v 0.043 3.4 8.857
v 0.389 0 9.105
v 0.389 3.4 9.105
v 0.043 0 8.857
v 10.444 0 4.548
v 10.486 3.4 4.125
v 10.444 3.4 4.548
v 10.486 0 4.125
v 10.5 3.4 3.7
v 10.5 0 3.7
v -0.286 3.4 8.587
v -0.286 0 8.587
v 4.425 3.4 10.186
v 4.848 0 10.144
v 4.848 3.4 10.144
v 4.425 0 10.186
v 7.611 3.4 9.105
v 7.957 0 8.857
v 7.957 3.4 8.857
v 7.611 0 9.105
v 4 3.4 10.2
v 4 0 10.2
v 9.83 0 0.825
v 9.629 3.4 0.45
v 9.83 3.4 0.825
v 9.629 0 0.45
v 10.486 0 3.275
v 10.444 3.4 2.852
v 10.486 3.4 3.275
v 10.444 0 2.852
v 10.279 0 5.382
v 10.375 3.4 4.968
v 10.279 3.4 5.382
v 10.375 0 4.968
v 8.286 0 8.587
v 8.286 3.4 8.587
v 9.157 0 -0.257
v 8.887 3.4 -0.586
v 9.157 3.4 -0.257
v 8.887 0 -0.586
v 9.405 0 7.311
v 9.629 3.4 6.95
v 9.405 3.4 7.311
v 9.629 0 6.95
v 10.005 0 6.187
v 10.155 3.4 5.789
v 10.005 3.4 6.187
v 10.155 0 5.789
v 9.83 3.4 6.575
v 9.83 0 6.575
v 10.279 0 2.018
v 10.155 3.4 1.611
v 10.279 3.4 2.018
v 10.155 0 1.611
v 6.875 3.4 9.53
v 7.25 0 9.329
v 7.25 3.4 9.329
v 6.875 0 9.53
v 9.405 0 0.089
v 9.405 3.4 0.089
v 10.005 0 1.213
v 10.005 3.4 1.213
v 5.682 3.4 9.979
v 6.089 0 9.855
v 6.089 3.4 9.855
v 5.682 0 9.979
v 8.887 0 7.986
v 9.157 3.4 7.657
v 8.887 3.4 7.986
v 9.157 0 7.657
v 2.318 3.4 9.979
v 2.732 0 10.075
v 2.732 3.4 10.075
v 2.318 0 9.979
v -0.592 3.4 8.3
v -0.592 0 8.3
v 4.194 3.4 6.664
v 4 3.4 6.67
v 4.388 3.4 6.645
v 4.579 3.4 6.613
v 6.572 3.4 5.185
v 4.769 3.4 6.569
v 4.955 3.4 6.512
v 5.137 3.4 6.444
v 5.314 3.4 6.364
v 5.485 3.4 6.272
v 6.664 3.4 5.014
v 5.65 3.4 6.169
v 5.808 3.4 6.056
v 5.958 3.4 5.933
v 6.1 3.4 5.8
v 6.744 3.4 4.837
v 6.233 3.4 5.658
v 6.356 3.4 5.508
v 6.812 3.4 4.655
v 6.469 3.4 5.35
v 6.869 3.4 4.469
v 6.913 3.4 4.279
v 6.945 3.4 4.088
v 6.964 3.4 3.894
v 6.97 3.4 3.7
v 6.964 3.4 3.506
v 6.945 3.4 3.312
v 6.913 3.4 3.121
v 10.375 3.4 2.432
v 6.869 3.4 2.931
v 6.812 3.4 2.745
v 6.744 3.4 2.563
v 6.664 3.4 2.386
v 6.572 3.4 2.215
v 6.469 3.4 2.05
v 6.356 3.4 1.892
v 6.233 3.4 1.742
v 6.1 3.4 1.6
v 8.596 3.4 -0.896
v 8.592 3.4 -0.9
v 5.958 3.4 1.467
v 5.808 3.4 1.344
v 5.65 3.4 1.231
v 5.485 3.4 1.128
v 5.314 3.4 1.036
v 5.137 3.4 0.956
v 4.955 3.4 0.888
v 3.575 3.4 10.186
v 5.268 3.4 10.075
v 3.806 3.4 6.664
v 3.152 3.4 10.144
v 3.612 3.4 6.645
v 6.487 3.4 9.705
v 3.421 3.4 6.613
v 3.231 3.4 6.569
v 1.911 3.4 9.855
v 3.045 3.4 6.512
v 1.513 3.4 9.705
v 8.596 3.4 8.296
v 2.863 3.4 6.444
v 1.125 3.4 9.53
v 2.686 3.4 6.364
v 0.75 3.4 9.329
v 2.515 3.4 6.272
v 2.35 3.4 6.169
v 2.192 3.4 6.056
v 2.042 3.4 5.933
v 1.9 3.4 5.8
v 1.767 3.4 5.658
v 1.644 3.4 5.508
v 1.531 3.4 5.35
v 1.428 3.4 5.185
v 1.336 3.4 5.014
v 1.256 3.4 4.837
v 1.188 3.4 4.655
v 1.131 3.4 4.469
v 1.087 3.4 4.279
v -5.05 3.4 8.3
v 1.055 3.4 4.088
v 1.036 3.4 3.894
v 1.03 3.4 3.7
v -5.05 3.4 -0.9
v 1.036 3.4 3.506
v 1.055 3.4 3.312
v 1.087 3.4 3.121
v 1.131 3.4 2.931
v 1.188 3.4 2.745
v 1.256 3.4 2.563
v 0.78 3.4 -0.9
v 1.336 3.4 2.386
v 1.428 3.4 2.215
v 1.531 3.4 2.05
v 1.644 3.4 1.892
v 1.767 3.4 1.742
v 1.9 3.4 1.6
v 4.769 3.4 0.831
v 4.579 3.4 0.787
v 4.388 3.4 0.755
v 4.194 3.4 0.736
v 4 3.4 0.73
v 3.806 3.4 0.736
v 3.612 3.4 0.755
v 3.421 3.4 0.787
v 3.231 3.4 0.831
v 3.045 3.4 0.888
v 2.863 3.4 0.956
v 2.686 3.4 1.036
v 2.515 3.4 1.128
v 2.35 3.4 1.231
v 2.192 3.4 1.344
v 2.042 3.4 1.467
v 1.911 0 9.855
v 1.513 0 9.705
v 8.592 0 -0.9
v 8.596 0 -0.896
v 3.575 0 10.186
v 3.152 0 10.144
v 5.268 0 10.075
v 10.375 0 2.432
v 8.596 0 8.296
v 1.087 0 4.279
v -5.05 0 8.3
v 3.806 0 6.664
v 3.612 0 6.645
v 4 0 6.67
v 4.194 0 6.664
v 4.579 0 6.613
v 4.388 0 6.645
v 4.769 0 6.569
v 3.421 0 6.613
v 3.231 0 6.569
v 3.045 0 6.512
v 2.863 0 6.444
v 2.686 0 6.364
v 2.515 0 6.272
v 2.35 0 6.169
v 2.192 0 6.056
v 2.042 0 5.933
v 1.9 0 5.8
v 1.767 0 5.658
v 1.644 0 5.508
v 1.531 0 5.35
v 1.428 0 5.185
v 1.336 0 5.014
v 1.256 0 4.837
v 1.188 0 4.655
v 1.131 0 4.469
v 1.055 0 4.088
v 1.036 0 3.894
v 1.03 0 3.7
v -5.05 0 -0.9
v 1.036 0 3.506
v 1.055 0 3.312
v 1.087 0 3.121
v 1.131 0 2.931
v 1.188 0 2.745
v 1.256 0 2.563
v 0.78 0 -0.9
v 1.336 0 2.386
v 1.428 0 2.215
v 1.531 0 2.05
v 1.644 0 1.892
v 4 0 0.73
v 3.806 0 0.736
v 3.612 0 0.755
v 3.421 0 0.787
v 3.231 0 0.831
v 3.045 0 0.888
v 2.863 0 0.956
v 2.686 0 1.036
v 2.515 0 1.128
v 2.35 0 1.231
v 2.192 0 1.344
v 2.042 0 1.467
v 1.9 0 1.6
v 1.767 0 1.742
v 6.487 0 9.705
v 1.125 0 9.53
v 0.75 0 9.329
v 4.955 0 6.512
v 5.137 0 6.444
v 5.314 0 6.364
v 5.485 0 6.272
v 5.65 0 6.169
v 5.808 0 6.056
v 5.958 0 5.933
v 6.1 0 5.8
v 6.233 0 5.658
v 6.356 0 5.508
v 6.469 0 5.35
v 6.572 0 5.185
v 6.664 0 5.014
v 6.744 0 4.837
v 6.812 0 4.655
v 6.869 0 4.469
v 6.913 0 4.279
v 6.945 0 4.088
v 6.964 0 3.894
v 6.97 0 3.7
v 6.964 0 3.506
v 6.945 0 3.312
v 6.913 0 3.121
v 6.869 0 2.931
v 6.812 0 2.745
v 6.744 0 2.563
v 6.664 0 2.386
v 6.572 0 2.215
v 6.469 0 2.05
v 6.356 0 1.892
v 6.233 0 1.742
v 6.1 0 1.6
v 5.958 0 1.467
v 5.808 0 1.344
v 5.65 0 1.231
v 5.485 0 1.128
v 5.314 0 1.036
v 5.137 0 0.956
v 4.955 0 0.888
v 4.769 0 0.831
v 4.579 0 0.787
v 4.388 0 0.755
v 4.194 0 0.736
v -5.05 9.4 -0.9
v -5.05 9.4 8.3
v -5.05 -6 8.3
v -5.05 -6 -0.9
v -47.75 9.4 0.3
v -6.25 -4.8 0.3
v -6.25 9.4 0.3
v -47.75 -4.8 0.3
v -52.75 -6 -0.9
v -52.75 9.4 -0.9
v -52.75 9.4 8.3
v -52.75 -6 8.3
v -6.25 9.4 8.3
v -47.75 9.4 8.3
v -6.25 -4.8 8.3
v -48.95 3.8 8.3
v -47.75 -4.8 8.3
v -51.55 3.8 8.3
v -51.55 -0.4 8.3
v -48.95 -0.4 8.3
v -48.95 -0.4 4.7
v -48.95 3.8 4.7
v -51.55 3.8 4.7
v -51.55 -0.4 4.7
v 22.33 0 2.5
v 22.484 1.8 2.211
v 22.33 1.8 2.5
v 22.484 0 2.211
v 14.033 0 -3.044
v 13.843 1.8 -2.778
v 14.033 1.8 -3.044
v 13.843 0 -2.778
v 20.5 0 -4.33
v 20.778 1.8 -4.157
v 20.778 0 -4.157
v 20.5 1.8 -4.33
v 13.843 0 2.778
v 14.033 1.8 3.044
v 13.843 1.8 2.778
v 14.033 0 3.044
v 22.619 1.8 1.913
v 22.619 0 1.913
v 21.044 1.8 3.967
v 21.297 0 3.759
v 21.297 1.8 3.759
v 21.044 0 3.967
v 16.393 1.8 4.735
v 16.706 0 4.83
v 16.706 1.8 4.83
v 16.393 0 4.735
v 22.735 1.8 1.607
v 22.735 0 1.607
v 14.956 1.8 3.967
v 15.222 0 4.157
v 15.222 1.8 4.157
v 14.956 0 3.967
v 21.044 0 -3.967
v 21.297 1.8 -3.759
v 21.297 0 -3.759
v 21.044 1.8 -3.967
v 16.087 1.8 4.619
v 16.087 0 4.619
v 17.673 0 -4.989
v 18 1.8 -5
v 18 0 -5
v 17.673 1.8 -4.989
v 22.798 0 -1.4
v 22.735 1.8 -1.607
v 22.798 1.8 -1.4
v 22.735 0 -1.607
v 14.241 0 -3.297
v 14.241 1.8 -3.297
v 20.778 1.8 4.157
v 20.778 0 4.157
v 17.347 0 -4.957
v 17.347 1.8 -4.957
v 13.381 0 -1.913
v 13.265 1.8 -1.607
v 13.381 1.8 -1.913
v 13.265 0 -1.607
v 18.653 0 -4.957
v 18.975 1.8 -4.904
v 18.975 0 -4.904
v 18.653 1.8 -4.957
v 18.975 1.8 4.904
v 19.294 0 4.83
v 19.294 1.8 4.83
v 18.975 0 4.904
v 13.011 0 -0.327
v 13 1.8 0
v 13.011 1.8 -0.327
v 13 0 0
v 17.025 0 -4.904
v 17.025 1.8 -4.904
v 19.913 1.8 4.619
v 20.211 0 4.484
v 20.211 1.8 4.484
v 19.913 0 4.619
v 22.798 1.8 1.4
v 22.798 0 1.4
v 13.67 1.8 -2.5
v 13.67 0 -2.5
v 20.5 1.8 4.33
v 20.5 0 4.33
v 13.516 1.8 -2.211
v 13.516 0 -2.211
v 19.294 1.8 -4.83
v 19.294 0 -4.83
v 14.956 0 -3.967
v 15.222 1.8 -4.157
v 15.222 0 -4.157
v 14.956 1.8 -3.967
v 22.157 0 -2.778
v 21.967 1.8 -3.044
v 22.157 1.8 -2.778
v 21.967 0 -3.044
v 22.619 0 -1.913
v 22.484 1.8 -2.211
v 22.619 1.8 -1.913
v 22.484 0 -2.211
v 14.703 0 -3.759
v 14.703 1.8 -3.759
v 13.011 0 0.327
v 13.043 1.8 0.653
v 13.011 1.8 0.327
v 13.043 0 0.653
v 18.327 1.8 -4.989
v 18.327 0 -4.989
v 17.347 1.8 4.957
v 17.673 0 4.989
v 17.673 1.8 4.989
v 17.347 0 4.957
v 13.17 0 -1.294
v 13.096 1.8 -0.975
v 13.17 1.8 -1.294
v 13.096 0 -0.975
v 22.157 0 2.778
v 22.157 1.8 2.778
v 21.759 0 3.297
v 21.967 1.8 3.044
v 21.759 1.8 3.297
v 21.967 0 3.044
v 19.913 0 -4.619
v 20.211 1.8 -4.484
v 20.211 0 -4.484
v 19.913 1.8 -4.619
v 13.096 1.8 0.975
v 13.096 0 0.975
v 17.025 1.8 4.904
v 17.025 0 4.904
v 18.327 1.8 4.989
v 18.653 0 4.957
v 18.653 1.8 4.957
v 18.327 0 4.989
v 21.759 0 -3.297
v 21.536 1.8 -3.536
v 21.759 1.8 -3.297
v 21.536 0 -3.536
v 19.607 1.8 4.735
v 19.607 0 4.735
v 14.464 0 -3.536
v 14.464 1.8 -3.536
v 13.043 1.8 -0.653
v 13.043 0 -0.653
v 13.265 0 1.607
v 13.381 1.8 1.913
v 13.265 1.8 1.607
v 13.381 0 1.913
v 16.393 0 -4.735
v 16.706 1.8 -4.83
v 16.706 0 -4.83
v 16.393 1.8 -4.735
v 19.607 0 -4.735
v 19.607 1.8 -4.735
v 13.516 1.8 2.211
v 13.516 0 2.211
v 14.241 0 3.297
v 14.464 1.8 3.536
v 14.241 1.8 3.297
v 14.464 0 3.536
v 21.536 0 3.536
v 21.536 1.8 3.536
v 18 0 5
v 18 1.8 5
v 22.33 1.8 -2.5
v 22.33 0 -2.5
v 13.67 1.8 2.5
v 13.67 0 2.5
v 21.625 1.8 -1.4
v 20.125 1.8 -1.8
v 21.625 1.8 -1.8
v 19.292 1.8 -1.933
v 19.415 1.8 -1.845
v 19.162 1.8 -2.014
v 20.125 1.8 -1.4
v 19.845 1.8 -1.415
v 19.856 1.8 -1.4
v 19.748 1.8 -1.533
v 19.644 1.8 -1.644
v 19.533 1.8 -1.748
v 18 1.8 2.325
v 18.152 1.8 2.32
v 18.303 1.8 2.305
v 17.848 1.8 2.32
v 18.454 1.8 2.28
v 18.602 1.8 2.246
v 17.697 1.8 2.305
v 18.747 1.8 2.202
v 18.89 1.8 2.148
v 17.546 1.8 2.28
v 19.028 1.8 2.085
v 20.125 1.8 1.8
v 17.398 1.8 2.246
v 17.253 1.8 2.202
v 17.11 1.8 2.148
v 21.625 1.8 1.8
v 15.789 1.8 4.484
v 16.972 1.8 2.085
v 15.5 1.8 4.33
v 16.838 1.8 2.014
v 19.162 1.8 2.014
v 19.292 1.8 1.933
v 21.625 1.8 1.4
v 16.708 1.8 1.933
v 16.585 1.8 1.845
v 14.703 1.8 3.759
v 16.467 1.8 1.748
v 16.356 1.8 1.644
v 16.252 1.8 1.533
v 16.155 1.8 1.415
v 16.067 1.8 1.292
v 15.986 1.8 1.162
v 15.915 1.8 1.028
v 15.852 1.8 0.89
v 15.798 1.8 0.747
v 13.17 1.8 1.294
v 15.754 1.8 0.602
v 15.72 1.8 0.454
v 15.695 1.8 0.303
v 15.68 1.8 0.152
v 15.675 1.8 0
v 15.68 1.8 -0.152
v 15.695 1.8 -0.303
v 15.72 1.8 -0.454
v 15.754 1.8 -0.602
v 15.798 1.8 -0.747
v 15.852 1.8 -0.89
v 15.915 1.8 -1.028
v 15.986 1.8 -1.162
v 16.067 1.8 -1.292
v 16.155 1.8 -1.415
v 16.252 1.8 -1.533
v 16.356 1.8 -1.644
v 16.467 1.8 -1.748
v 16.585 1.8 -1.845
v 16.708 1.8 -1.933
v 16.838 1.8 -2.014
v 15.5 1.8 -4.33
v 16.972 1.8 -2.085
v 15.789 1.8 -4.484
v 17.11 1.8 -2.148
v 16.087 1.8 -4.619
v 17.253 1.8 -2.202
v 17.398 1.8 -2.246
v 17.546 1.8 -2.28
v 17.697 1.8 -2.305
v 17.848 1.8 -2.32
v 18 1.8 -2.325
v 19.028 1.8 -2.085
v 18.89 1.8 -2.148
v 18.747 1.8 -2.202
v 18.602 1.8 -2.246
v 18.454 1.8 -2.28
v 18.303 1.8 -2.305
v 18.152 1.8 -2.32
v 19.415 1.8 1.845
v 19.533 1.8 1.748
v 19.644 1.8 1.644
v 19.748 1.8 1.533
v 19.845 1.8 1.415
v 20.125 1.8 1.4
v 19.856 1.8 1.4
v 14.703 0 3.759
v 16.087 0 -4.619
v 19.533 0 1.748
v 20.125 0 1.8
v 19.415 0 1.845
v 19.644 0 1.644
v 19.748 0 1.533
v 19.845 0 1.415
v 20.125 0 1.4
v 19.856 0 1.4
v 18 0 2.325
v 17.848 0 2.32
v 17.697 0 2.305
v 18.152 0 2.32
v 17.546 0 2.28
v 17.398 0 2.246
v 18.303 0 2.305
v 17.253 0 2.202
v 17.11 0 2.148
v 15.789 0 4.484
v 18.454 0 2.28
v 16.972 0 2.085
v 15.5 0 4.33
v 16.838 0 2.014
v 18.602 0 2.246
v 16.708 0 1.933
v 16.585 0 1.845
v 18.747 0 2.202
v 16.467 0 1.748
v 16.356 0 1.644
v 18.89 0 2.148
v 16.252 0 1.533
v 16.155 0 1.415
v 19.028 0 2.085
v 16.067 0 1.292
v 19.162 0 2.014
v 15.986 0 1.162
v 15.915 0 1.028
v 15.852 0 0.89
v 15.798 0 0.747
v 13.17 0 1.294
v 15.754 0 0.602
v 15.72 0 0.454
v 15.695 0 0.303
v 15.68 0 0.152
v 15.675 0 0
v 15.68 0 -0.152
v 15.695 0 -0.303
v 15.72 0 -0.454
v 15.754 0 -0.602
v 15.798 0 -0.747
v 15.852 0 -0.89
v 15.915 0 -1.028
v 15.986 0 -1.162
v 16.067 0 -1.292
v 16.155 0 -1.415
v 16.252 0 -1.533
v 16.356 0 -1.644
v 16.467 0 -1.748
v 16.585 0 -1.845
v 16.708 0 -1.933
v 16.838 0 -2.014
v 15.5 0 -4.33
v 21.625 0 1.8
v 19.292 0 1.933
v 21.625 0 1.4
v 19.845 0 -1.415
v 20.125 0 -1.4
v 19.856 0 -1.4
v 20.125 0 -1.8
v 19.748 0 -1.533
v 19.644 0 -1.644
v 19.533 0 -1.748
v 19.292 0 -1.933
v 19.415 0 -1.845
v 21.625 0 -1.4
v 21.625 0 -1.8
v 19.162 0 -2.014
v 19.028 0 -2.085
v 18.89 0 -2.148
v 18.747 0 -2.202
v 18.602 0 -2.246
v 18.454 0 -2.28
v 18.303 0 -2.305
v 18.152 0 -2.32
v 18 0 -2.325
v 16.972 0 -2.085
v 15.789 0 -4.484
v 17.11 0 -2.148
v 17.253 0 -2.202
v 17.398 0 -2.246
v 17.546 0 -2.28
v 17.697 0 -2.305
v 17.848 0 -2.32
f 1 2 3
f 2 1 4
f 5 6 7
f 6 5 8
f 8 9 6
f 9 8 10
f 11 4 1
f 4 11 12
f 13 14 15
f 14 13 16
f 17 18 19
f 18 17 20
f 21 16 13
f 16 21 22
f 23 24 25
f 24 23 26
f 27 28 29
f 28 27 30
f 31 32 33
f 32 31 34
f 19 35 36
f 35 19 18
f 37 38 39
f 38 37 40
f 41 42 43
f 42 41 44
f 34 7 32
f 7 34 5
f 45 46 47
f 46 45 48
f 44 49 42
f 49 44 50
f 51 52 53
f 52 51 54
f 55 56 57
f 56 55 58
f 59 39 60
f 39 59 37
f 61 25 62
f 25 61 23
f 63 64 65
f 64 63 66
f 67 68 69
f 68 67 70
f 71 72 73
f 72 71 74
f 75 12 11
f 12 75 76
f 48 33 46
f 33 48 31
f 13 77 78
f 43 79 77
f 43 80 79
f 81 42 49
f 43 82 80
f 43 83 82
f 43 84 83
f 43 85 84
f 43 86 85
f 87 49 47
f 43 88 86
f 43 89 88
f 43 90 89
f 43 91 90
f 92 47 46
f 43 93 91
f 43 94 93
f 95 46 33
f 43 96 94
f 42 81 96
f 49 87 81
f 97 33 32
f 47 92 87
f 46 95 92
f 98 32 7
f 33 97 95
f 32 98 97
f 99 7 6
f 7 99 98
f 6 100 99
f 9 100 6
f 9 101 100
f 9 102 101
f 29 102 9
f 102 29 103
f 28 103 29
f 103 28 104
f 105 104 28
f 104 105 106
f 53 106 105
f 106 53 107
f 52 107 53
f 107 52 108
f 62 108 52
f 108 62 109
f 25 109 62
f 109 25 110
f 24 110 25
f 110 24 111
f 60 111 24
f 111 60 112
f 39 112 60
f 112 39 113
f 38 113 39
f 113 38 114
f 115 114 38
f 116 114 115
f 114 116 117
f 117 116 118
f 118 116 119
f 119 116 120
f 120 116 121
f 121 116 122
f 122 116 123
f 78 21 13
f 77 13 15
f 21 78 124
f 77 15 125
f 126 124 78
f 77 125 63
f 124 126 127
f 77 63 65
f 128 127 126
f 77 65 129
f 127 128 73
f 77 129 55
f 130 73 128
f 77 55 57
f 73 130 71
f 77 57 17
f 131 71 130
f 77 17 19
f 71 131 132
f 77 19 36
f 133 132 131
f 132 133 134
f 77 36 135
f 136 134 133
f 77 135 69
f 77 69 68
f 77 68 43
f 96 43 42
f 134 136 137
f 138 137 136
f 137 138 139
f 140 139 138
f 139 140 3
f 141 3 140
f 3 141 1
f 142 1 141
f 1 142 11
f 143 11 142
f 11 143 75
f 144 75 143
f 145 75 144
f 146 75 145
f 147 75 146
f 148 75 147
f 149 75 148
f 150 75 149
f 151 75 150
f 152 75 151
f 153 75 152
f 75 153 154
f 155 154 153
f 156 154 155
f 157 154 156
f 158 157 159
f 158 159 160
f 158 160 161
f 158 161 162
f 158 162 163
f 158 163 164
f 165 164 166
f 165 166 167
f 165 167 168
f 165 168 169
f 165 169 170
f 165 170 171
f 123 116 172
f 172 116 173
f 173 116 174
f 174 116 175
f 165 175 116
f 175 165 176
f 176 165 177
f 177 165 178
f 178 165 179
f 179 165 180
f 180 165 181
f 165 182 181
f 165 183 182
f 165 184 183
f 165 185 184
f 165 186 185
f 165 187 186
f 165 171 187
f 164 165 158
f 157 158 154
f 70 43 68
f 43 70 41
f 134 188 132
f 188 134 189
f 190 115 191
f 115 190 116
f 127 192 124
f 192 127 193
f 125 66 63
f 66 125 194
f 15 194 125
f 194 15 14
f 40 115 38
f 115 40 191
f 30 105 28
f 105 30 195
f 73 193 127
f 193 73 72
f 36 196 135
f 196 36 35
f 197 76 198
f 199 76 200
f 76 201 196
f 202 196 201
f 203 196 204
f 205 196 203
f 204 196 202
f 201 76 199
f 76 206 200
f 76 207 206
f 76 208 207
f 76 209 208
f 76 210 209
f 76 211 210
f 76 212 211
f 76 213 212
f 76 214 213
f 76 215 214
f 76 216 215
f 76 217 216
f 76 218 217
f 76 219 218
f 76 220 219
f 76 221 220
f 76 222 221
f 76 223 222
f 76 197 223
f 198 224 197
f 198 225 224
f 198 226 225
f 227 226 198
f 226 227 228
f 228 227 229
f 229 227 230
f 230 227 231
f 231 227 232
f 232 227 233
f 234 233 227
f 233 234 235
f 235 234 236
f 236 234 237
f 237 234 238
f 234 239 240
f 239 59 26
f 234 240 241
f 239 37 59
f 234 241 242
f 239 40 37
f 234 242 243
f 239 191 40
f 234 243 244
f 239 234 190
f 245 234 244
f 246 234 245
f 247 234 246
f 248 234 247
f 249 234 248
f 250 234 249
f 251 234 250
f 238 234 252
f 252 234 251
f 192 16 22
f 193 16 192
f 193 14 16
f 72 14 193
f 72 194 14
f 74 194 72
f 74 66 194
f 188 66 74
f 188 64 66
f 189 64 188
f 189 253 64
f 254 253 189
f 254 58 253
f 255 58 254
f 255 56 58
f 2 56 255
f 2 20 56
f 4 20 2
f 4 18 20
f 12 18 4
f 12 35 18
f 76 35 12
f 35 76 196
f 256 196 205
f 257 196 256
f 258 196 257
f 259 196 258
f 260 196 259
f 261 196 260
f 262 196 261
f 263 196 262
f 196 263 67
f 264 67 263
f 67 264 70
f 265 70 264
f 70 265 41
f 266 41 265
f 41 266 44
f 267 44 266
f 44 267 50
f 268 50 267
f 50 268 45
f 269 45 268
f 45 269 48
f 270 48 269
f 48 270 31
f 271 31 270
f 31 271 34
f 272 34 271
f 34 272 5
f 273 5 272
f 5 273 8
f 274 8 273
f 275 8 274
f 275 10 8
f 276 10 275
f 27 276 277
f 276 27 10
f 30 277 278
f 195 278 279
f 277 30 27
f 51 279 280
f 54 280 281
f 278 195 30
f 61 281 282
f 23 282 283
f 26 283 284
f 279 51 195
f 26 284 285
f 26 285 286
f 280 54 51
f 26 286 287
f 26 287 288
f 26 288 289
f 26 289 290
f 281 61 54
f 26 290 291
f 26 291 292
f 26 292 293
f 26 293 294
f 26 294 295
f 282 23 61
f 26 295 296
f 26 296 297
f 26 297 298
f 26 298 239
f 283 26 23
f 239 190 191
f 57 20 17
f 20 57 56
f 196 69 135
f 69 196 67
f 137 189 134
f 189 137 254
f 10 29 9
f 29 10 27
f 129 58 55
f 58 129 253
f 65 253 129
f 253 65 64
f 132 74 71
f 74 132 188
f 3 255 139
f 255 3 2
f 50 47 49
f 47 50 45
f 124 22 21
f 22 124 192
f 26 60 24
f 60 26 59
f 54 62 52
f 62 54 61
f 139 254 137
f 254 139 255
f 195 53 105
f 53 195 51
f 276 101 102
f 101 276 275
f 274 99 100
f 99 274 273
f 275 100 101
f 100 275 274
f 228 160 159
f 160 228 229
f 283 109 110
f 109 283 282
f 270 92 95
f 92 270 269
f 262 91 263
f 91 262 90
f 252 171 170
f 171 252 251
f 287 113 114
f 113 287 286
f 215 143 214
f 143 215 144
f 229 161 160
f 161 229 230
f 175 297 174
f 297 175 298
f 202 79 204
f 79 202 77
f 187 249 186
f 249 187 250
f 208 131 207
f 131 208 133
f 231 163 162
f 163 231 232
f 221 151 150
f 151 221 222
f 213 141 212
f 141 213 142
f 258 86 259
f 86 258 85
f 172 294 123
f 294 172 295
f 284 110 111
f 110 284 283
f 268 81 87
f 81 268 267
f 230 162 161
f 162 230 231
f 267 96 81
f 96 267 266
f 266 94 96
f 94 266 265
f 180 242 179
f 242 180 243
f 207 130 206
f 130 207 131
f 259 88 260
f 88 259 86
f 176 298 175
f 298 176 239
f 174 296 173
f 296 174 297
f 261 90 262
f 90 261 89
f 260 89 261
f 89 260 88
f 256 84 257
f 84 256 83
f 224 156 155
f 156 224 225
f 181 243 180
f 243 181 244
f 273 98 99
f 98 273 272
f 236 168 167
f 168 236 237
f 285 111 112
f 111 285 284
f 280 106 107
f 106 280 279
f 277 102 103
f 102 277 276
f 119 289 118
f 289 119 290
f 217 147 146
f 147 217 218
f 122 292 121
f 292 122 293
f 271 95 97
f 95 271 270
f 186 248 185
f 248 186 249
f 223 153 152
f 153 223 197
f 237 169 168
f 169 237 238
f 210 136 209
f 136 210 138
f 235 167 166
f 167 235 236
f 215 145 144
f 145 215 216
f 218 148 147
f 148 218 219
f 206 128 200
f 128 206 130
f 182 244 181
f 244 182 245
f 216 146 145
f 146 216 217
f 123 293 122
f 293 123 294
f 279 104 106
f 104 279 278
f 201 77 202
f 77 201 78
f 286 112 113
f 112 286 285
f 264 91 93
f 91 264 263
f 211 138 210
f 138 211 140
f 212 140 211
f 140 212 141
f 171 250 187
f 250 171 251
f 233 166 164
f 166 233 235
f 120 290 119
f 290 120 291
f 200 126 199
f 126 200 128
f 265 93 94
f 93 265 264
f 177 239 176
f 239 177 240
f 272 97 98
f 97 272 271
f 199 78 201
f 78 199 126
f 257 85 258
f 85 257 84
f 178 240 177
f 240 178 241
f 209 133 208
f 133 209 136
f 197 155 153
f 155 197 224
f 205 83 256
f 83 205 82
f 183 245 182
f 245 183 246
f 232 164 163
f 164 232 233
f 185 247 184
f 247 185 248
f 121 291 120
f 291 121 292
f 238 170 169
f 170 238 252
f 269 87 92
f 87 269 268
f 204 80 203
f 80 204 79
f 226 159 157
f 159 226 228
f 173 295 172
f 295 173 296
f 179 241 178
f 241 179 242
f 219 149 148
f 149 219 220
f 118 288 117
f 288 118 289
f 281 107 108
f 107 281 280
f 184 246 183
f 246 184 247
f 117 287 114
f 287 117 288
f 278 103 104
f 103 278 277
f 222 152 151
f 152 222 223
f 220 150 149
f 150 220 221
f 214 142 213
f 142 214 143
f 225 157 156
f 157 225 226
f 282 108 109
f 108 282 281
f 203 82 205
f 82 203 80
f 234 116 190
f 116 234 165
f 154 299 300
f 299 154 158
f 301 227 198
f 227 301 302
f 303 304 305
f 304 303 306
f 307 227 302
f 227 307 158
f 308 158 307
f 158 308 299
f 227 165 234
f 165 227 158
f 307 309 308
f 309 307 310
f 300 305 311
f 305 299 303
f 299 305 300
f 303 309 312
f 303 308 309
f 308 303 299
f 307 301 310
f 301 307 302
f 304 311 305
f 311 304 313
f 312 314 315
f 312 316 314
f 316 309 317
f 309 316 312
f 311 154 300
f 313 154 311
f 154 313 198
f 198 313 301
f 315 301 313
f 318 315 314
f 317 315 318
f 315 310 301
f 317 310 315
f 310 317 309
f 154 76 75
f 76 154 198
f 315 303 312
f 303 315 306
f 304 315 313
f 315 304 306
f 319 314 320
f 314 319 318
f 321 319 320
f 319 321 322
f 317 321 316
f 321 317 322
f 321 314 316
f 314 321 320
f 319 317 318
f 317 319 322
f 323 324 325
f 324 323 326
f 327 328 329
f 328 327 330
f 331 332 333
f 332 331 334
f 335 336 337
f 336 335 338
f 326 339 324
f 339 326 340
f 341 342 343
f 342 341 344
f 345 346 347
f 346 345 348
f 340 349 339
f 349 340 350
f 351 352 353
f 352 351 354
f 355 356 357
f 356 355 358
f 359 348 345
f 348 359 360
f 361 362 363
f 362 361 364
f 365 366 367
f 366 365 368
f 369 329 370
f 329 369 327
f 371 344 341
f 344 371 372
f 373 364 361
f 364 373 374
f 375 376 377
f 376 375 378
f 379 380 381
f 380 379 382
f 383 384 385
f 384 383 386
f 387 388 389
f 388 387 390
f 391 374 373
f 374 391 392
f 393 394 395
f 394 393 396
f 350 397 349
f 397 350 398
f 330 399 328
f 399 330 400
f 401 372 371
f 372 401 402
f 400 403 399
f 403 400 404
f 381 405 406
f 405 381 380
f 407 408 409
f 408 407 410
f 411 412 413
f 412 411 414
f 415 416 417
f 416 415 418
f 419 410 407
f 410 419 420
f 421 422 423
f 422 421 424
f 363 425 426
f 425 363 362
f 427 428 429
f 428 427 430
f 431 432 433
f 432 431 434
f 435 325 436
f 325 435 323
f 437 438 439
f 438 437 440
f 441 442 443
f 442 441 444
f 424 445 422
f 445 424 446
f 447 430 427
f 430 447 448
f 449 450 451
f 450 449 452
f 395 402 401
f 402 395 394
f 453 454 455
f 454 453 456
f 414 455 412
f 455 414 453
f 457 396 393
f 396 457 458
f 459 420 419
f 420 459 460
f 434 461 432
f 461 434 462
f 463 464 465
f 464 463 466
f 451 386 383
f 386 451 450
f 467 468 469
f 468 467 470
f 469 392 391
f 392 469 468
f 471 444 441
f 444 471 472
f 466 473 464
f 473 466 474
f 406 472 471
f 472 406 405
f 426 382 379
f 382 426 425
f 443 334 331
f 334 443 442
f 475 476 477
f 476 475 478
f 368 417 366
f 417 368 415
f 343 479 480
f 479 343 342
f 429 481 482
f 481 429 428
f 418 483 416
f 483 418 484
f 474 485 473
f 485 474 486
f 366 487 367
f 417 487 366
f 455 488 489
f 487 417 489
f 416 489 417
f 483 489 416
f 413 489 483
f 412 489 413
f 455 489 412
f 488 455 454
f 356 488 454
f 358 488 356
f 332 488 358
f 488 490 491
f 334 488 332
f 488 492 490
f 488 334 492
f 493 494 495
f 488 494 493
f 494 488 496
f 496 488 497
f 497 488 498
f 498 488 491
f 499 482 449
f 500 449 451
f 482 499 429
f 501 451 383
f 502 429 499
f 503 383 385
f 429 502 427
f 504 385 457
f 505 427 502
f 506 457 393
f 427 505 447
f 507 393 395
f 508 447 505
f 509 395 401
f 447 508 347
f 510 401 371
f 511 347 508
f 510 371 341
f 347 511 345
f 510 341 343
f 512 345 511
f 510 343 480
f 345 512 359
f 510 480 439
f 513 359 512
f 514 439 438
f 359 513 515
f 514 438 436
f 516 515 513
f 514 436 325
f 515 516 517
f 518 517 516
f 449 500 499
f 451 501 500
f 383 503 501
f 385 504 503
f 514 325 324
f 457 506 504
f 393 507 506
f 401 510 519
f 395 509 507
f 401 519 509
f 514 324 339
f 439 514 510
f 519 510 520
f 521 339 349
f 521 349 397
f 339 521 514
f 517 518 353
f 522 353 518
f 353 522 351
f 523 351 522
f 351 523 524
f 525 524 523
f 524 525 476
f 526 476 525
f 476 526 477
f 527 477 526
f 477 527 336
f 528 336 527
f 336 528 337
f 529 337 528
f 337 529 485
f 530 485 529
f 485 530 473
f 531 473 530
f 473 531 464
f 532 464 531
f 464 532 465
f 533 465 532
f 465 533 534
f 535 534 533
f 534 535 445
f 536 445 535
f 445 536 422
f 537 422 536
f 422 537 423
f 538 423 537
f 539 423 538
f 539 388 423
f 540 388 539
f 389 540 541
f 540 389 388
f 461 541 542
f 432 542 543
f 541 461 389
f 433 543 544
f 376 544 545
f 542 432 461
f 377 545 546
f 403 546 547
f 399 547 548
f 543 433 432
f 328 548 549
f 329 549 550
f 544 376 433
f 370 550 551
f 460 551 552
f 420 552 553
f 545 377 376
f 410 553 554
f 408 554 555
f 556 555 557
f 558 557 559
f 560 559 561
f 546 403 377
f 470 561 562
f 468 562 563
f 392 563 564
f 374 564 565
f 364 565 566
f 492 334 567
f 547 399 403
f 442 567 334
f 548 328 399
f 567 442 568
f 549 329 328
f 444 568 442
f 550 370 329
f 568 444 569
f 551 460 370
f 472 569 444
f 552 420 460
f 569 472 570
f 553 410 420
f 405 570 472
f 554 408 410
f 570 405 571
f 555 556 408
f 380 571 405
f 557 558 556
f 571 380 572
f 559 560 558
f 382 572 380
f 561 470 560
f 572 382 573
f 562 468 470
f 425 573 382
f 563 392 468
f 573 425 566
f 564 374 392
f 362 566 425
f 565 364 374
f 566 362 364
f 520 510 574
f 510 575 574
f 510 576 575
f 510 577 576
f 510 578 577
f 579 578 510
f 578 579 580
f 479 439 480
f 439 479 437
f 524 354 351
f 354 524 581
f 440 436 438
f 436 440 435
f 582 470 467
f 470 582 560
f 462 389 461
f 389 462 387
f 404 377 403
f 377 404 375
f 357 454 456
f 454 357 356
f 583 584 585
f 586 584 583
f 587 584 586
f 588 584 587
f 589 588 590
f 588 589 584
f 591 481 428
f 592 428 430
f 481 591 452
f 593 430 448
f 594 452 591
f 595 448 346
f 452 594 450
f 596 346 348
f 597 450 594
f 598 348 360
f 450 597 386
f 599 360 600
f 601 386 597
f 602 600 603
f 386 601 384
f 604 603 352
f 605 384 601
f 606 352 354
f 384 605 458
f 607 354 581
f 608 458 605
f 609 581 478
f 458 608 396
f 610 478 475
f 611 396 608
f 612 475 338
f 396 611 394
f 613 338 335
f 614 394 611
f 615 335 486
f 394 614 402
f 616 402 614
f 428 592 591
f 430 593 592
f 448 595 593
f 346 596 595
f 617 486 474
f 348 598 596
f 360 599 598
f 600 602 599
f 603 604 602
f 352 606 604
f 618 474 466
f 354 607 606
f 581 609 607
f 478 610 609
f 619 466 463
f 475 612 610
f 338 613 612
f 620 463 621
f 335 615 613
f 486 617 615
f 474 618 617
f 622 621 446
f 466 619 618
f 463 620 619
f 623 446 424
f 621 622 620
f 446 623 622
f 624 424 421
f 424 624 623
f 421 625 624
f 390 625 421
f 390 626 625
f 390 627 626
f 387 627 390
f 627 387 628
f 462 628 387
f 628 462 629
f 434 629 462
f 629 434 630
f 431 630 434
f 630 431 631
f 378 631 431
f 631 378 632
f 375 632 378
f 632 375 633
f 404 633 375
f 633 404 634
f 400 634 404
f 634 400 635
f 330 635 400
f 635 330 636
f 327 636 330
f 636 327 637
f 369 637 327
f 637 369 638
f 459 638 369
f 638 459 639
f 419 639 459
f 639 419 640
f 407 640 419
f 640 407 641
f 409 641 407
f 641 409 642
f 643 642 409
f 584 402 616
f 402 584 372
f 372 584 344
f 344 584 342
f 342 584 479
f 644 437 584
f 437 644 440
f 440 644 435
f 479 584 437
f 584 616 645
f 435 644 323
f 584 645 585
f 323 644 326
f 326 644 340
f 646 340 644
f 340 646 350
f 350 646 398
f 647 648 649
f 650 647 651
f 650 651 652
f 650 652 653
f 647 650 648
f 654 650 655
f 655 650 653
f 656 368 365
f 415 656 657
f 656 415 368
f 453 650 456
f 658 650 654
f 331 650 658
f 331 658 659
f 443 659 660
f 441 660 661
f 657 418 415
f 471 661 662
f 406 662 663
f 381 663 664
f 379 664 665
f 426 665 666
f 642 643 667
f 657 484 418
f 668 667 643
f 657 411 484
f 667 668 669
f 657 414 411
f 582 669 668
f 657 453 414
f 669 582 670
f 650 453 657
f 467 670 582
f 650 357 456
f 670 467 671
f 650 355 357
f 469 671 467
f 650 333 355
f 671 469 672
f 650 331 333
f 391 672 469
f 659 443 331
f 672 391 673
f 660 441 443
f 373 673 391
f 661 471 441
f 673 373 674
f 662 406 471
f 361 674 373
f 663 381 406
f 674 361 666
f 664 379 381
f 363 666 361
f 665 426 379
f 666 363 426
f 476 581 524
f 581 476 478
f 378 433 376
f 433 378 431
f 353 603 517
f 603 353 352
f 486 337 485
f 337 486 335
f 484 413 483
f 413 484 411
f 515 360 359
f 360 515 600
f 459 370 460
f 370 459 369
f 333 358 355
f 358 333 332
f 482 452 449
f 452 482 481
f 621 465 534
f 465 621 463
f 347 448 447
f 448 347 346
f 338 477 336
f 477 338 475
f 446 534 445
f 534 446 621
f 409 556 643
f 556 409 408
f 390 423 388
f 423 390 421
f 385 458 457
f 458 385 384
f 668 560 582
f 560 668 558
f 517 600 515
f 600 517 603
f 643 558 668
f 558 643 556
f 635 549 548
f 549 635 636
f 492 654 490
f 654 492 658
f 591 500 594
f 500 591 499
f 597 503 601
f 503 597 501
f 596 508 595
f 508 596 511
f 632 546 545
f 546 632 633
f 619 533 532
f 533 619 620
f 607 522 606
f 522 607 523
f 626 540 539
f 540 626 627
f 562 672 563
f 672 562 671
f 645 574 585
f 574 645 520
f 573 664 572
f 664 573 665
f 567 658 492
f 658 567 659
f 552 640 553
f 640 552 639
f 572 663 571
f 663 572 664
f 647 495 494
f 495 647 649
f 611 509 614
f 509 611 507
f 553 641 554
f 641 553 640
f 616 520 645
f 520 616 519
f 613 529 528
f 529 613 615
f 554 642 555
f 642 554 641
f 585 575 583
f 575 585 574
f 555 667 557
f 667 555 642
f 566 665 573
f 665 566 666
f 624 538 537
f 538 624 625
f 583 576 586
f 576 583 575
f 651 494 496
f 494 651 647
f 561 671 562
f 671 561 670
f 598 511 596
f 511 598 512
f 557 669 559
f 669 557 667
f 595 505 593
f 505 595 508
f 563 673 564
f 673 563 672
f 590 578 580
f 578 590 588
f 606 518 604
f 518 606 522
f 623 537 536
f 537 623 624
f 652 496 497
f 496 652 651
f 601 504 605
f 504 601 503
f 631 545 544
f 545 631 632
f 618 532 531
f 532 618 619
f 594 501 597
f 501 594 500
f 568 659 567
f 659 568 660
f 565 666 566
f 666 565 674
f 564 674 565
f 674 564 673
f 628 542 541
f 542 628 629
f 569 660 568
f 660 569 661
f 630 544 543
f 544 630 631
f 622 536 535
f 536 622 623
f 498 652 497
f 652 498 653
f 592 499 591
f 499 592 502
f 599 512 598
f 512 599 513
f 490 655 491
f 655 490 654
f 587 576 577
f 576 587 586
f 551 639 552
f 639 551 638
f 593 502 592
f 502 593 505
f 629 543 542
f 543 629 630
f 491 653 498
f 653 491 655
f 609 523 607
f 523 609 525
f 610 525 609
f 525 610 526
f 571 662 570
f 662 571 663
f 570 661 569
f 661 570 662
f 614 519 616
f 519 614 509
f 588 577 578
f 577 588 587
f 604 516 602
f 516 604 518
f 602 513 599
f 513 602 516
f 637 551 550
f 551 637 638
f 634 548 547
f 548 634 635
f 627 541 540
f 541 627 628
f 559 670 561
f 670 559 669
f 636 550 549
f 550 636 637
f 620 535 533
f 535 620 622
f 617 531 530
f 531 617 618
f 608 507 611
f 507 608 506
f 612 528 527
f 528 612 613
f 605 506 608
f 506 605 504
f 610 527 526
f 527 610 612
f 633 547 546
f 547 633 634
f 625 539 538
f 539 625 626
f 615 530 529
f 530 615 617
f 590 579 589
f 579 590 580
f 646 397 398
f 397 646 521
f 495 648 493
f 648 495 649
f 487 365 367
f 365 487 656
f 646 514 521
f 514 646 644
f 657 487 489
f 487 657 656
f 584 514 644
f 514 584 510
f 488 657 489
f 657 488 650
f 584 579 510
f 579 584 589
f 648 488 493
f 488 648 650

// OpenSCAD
$fn = 96;

eps = 0.05;

// 0 = separated printable latch and keeper
// 1 = FN-weight latch only
// 2 = C-shaped keeper only
render_part = 0;

// =========================================================
// FN WEIGHT LATCH
// =========================================================
post_d = 5.5;
clear_radial = 0.22;
eye_inner_d = post_d + 2 * clear_radial;
eye_outer_d = 13.0;

latch_t = 3.4;
pivot_x = 4.0;

corral_clear_w_x = 41.5;
corral_clear_d_y = 13.0;
corral_wall_t = 1.2;
corral_depth_z = 8.0;
corral_floor_t = 1.2;
corral_end_wall_t_x = 5.0;
canonical_weight_center_x = -27.0;

// Match the installed latch plane used by the canonical dry-wall rig.
standoff_h = 0.8;
post_h = 4.0;
corral_global_outer_y1 = -0.30;
corral_center_y_target = corral_global_outer_y1
                         - (corral_clear_d_y + 2 * corral_wall_t) / 2;
pad_t = -corral_center_y_target - standoff_h - post_h / 2;
post_y1 = -pad_t - standoff_h - post_h;
latch_install_y = post_y1 + (post_h - latch_t) / 2;

corral_inner_x0 = canonical_weight_center_x - corral_clear_w_x / 2;
corral_inner_x1 = canonical_weight_center_x + corral_clear_w_x / 2;
corral_floor_x0 = corral_inner_x0 - corral_end_wall_t_x;
corral_floor_x1 = corral_inner_x1 + corral_wall_t;

corral_outer_y1 = corral_global_outer_y1 - latch_install_y;
corral_inner_y1 = corral_outer_y1 - corral_wall_t;
corral_inner_y0 = corral_inner_y1 - corral_clear_d_y;
corral_outer_y0 = corral_inner_y0 - corral_wall_t;

corral_floor_z0 = -0.90;
corral_floor_z = corral_floor_z0 + corral_floor_t;
corral_wall_z1 = corral_floor_z + corral_depth_z;
pivot_z = (corral_floor_z0 + corral_wall_z1) / 2;
pivot_eye_flat_local_z = corral_floor_z0 - pivot_z;

pivot_transition_x0 = corral_floor_x1;
pivot_transition_x1 = pivot_x - (eye_inner_d / 2 + 0.25);

// Far-end Y-retention socket. The matching roof-hung tooth belongs to the
// fixed dry-wall rig; this socket is open at the top so the latch disengages
// cleanly as it swings downward.
latch_key_tooth_w_x = 1.4;
latch_key_tooth_w_y = 3.0;
latch_key_clear_xy = 0.60;
latch_key_clear_z = 0.60;
latch_key_engagement_z = 3.0;

latch_key_xc = (corral_floor_x0 + corral_inner_x0) / 2;
latch_key_local_yc = (corral_outer_y0 + corral_outer_y1) / 2;
latch_key_notch_x0 = latch_key_xc - latch_key_tooth_w_x / 2
                     - latch_key_clear_xy;
latch_key_notch_x1 = latch_key_xc + latch_key_tooth_w_x / 2
                     + latch_key_clear_xy;
latch_key_notch_y0 = latch_key_local_yc - latch_key_tooth_w_y / 2
                     - latch_key_clear_xy;
latch_key_notch_y1 = latch_key_local_yc + latch_key_tooth_w_y / 2
                     + latch_key_clear_xy;
latch_key_notch_z0 = corral_wall_z1 - latch_key_engagement_z
                     - latch_key_clear_z;

// =========================================================
// C-SHAPED KEEPER
// =========================================================
clip_outer_d = 10.0;
clip_t = 1.8;
grip_hole_d = 4.65;
gap_w = 2.8;
flat_depth = 1.5;

// =========================================================
// HELPERS
// =========================================================
module rect_prism(x0, x1, y0, y1, z0, z1) {
    translate([min(x0, x1), min(y0, y1), min(z0, z1)])
        cube([abs(x1 - x0), abs(y1 - y0), abs(z1 - z0)]);
}

module cyl_y_span(d, y0, y1) {
    translate([0, max(y0, y1), 0])
        rotate([90, 0, 0])
            cylinder(d=d, h=abs(y1 - y0), center=false);
}

// =========================================================
// PRINTABLE PARTS
// =========================================================
module canonical_latch_core() {
    translate([pivot_x, 0, pivot_z])
        difference() {
            cyl_y_span(eye_outer_d, 0, latch_t);
            cyl_y_span(eye_inner_d, -0.1, latch_t + 0.2);

            // Flatten only the unused lower eye arc so the complete latch
            // prints on the same plane as the corral floor.
            rect_prism(-eye_outer_d / 2 - 1,
                       eye_outer_d / 2 + 1,
                       -0.1, latch_t + 0.2,
                       -eye_outer_d / 2 - 1,
                       pivot_eye_flat_local_z);
        }
}

module fn_weight_corral() {
    difference() {
        union() {
            // Shallow floor beneath the weight pocket and keyed extension.
            rect_prism(corral_floor_x0, corral_floor_x1,
                       corral_outer_y0, corral_outer_y1,
                       corral_floor_z0, corral_floor_z);

            // Viewer-facing wall. The frame wall closes the opposite side.
            rect_prism(corral_inner_x0, corral_inner_x1,
                       corral_outer_y0, corral_inner_y0,
                       corral_floor_z, corral_wall_z1);

            // Pivot-side wall.
            rect_prism(corral_inner_x1, corral_floor_x1,
                       corral_outer_y0, corral_outer_y1,
                       corral_floor_z, corral_wall_z1);

            // Substantial far-end wall carrying the retention socket.
            rect_prism(corral_floor_x0, corral_inner_x0,
                       corral_outer_y0, corral_outer_y1,
                       corral_floor_z, corral_wall_z1);

            // Compact load path from the corral into the pivot eye.
            rect_prism(pivot_transition_x0, pivot_transition_x1,
                       0, latch_t,
                       corral_floor_z0, corral_wall_z1);
        }

        rect_prism(latch_key_notch_x0, latch_key_notch_x1,
                   latch_key_notch_y0, latch_key_notch_y1,
                   latch_key_notch_z0, corral_wall_z1 + eps);
    }
}

module swinging_latch() {
    union() {
        canonical_latch_core();
        fn_weight_corral();
    }
}

module c_keeper() {
    difference() {
        cyl_y_span(clip_outer_d, 0, clip_t);
        cyl_y_span(grip_hole_d, -0.1, clip_t + 0.2);

        rect_prism(0, clip_outer_d / 2 + 0.5,
                   -0.1, clip_t + 0.1,
                   -gap_w / 2, gap_w / 2);

        rect_prism(grip_hole_d / 2 - 0.2,
                   grip_hole_d / 2 - 0.2 + flat_depth,
                   -0.1, clip_t + 0.1,
                   -gap_w / 2 - 0.4, gap_w / 2 + 0.4);
    }
}

assert(corral_clear_w_x == 41.5);
assert(corral_clear_d_y == 13.0);
assert(pivot_transition_x1 > pivot_transition_x0);

if (render_part == 1)
    swinging_latch();
else if (render_part == 2)
    c_keeper();
else {
    swinging_latch();
    translate([18, 0, 0]) c_keeper();
}
